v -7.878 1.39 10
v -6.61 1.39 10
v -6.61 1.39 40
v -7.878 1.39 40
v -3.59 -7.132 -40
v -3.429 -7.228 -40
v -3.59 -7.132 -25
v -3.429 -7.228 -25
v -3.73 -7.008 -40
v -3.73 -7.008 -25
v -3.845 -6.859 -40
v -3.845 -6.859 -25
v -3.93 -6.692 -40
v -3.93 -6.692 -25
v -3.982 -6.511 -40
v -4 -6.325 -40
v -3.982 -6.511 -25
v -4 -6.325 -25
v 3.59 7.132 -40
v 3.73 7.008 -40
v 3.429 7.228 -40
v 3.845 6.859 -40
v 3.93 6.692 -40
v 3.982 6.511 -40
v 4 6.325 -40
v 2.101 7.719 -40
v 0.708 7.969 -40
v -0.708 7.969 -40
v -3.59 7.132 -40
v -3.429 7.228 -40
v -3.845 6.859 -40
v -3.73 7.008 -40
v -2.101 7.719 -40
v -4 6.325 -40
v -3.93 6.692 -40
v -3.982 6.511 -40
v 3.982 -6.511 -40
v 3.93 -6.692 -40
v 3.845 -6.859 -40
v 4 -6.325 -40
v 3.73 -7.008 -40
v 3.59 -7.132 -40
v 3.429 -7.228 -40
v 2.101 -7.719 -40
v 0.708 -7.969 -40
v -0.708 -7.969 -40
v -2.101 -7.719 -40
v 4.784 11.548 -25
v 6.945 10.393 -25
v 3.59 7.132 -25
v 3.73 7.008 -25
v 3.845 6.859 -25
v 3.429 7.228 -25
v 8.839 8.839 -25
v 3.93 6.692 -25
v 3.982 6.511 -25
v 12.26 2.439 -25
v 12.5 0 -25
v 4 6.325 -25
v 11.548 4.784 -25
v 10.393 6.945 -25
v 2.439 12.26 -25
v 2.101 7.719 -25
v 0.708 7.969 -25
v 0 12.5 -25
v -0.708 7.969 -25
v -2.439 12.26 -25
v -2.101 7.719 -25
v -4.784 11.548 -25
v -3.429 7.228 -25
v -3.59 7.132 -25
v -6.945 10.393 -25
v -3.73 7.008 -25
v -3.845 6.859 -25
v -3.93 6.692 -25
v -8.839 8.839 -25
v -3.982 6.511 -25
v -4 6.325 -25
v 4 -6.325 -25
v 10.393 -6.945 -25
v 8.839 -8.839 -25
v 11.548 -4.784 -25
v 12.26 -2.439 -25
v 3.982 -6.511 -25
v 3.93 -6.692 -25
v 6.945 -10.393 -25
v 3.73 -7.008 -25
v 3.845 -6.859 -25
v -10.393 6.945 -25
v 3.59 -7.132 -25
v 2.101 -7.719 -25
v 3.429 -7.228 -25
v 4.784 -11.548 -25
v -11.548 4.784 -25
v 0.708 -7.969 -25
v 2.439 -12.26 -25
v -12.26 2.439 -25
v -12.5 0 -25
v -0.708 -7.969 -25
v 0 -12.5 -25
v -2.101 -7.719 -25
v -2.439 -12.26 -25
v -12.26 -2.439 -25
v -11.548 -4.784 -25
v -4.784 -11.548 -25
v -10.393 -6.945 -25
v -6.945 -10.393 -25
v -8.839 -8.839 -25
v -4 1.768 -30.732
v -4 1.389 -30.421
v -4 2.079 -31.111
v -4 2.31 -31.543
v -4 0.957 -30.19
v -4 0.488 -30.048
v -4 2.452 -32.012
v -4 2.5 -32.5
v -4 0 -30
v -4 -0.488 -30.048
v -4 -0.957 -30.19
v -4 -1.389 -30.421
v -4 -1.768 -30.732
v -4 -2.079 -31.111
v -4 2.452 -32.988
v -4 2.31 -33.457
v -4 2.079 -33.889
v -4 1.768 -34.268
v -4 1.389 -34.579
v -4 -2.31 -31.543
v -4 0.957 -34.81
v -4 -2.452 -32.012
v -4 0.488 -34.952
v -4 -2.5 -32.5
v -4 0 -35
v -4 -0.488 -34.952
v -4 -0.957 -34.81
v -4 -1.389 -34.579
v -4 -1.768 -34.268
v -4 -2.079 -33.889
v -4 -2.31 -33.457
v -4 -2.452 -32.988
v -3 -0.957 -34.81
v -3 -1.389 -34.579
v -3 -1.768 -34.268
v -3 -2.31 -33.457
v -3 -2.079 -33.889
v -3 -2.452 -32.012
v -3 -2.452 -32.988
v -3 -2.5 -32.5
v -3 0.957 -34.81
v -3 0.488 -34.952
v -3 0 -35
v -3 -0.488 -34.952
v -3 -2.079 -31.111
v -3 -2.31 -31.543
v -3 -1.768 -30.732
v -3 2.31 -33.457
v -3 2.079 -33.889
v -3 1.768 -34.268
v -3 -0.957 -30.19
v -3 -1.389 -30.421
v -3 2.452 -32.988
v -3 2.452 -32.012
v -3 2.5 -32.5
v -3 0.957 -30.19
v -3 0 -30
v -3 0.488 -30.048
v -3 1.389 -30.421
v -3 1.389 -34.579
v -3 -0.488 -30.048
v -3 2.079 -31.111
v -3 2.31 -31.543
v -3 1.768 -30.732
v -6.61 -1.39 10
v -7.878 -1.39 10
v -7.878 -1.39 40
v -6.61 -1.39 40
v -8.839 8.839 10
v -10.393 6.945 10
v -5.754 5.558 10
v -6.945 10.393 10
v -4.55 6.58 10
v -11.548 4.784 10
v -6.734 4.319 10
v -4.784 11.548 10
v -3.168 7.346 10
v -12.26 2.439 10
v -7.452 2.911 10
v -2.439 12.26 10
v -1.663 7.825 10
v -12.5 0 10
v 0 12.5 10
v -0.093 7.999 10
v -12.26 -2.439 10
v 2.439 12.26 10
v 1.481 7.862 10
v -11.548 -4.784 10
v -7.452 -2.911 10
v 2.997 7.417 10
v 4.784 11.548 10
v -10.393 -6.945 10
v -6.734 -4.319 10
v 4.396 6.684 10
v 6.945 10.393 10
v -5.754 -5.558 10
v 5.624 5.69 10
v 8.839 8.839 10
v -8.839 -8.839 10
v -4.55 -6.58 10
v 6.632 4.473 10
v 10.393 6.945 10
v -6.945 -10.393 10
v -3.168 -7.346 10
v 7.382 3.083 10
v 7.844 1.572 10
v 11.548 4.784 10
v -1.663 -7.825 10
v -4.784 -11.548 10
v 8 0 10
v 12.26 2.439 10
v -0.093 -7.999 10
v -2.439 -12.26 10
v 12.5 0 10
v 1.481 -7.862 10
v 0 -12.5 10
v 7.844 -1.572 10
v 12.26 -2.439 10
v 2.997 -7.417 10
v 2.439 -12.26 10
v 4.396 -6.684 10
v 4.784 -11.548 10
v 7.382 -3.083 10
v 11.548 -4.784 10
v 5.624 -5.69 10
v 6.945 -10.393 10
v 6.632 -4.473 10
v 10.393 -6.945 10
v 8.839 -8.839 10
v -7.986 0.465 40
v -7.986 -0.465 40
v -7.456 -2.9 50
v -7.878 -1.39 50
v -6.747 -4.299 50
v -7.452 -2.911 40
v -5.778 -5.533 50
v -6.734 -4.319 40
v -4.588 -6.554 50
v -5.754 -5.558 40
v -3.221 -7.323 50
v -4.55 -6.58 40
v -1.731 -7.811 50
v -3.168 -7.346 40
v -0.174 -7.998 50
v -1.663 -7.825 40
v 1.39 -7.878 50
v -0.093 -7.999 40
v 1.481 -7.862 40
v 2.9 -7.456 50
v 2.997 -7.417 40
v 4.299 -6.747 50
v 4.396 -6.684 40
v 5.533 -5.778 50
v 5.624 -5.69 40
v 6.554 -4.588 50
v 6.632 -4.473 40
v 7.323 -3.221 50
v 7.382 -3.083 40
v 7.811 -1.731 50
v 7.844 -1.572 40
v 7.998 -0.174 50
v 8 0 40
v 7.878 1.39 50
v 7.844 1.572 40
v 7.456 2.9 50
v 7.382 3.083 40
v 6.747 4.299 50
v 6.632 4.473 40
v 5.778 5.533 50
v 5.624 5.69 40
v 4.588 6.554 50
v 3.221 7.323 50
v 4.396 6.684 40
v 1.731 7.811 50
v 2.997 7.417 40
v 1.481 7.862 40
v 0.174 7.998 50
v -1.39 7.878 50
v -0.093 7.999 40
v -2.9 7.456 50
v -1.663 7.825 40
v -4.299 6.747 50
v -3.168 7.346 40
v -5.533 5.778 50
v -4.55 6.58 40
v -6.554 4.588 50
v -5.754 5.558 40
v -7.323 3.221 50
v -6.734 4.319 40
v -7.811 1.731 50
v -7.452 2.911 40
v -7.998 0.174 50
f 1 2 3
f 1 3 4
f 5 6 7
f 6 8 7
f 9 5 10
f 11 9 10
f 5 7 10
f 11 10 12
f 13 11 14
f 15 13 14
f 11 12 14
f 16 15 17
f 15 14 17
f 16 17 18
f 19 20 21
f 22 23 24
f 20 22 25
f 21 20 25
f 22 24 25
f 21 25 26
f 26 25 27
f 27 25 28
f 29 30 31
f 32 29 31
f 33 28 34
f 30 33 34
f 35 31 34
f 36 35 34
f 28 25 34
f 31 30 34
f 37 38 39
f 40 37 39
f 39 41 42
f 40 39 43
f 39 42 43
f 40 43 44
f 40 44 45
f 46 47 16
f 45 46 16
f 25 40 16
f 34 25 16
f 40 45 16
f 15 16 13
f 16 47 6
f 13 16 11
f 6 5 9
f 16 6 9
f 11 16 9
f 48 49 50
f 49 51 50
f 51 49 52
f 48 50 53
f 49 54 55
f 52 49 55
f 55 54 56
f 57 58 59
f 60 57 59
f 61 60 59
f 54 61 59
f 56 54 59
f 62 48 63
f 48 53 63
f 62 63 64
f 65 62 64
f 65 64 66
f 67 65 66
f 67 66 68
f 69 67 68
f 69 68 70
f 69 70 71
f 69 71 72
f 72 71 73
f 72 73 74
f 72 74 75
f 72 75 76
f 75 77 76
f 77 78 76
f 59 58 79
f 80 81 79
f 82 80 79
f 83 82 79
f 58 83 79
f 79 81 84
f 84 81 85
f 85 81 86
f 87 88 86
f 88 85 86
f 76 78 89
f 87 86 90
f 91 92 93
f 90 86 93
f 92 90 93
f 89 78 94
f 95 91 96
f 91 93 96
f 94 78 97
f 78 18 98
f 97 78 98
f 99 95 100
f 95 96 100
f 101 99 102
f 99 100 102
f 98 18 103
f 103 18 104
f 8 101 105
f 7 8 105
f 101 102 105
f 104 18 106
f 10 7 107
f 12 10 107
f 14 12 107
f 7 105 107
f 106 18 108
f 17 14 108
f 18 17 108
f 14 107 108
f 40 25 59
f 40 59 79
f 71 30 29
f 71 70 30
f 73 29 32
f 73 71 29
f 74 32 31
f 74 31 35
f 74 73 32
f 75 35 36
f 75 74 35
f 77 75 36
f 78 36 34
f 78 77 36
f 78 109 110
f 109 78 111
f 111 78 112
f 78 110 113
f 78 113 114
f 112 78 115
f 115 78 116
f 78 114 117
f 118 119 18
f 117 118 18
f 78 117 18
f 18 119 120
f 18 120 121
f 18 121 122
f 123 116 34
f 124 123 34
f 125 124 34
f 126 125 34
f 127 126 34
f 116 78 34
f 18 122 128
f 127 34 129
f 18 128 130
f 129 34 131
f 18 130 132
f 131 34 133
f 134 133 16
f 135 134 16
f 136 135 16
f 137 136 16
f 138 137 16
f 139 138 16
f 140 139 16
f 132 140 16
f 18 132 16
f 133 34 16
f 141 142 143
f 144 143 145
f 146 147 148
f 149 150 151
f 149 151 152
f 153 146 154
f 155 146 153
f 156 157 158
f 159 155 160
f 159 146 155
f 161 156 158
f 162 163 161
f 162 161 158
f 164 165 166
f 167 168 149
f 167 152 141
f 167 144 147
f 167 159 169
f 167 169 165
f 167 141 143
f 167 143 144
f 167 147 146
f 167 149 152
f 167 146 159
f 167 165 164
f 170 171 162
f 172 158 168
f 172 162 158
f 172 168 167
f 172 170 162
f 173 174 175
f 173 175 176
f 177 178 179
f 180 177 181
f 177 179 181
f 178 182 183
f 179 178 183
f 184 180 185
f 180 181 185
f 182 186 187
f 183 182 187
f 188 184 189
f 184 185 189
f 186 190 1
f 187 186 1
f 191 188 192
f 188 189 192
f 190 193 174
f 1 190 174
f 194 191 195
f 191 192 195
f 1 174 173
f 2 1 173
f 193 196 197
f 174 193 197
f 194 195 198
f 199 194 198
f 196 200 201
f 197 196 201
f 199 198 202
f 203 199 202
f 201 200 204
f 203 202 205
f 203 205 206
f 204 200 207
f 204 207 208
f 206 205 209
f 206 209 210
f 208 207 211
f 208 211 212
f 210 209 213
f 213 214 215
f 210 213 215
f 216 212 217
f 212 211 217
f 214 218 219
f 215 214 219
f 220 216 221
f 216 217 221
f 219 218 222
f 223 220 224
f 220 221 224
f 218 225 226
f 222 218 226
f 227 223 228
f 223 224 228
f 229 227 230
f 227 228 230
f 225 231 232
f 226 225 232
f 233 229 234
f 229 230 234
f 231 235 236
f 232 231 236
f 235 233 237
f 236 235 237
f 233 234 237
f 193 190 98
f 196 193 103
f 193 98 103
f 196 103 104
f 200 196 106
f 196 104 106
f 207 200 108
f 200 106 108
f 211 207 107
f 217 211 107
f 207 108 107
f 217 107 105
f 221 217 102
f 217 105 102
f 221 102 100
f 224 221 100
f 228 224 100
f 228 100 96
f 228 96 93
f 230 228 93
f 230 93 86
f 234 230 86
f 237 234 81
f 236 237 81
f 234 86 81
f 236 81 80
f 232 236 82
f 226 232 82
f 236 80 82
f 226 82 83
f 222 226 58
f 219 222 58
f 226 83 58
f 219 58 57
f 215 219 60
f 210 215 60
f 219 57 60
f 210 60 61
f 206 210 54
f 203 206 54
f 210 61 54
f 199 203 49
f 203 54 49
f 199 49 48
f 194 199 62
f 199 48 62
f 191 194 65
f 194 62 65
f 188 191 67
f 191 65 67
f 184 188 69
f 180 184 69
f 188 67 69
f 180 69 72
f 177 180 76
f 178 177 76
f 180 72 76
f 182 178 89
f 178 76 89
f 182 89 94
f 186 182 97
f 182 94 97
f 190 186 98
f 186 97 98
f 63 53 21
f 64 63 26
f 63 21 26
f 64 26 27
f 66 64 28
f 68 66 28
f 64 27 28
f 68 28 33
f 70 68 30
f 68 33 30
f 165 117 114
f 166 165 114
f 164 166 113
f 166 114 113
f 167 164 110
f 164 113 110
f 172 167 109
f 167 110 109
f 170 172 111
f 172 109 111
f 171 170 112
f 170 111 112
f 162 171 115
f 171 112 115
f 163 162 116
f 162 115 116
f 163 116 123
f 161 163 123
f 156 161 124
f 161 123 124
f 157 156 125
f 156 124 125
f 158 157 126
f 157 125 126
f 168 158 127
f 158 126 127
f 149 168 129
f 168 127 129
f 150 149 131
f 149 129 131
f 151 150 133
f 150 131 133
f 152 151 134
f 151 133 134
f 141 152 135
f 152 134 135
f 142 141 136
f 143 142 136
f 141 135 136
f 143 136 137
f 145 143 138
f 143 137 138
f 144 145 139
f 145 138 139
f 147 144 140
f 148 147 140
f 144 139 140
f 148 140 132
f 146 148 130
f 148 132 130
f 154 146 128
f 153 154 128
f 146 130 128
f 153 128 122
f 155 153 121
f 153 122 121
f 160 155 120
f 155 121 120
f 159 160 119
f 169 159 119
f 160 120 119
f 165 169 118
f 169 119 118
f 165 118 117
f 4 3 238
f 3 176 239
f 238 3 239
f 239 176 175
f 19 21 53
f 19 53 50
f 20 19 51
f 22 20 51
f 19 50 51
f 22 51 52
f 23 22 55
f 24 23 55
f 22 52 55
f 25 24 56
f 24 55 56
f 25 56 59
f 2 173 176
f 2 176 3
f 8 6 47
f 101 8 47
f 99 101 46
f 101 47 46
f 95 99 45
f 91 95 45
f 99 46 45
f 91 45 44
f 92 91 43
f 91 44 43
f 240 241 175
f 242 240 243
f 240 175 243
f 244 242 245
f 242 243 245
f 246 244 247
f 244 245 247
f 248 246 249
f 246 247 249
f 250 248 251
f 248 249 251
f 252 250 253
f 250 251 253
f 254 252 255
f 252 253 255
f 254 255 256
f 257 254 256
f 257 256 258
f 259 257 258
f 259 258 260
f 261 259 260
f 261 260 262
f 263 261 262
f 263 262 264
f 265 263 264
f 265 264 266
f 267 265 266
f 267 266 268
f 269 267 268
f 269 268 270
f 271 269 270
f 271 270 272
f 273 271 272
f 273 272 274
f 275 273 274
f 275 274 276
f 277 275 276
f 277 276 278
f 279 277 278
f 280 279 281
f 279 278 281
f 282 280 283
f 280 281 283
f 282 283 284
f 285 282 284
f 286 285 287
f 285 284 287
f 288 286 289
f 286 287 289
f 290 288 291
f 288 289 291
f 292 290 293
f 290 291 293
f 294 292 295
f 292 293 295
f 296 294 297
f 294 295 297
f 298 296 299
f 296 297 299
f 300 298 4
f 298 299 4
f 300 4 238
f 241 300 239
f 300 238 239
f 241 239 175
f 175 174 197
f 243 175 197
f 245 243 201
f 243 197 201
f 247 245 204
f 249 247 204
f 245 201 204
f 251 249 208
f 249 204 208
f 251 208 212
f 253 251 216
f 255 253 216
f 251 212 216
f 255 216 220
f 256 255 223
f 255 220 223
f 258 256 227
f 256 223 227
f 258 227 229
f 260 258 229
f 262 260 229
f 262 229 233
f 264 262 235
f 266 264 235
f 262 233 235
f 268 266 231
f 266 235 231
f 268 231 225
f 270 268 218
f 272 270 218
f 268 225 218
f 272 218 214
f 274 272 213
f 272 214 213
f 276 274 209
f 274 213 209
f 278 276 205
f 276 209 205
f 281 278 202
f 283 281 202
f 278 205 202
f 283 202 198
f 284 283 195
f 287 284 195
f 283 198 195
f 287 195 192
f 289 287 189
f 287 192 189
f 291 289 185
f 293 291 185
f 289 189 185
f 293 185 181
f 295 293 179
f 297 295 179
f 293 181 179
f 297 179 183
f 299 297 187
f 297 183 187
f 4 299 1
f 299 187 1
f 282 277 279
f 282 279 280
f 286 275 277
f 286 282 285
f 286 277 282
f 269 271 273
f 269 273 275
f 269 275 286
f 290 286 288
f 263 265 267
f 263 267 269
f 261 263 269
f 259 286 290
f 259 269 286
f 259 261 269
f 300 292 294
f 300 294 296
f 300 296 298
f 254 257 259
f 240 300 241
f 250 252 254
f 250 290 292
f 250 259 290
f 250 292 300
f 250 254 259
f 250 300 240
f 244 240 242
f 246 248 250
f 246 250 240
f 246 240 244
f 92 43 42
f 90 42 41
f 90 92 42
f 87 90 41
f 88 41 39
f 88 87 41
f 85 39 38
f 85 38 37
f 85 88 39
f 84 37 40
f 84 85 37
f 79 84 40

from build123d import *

# Parameters (mm, degrees)
CUT_EXTRUDE2_START  = -30
CUT_EXTRUDE2_DEPTH  = 30
SKETCH6_R           = 8
BOSS_EXTRUDE1_DEPTH = 10
CUT_EXTRUDE3_DEPTH  = 15
FILLET1_R           = 1
SKETCH8_R           = 2.5
CUT_EXTRUDE4_DEPTH  = 1


with BuildPart() as part:
    # Sketch2 → Revolve2 (revolve)
    with BuildSketch(Plane(origin=(0, 0, 0), x_dir=(1, 0, 0), z_dir=(0, 1, 0)), mode=Mode.PRIVATE) as revolve2_sk:
        Polygon((0, -40), (8, -40), (8, -10), (12.5, -10), (12.5, 25), (8, 25), (8, 40), (0, 40), align=None)
    revolve(revolve2_sk.sketch.rotate(Axis((0, 0, -364.100348117), (0, 0, 1)), 180), axis=Axis((0, 0, -364.100348117), (0, 0, 1)))

    # Sketch4 → Cut-Extrude2 (cut)
    with BuildSketch(Plane.XY.offset(40).offset(CUT_EXTRUDE2_START)):
        with BuildLine():
            Line((-6.61, 1.39), (-7.878318348, 1.39))
            ThreePointArc((-7.878318348, 1.39), (-8, 0), (-7.878318348, -1.39))
            Line((-7.878318348, -1.39), (-6.61, -1.39))
            Line((-6.61, -1.39), (-6.61, 1.39))
        make_face()
    extrude(amount=CUT_EXTRUDE2_DEPTH, mode=Mode.SUBTRACT)

    # Sketch6 → Boss-Extrude1 (add)
    with BuildSketch(Plane.XY.offset(40)):
        with Locations(Location((0, 0, 0), (0, 0, 190.005924043))):
            Circle(SKETCH6_R)
    extrude(amount=BOSS_EXTRUDE1_DEPTH)

    # Sketch7 → Cut-Extrude3 (cut)
    with BuildSketch(Plane(origin=(0, 0, -40), x_dir=(-1, 0, 0), z_dir=(0, 0, -1))):
        with BuildLine():
            Line((-4, 6.92820323), (-4, -6.92820323))
            ThreePointArc((-4, -6.92820323), (-8, 0), (-4, 6.92820323))
        make_face()
        with BuildLine():
            Line((4, 6.92820323), (4, -6.92820323))
            ThreePointArc((4, -6.92820323), (8, 0), (4, 6.92820323))
        make_face()
    extrude(amount=-CUT_EXTRUDE3_DEPTH, mode=Mode.SUBTRACT)

    # Fillet1
    fillet1_edges = [part.edges().sort_by_distance(p)[0] for p in [
        (4, 6.92820323, -32.5),
        (4, -6.92820323, -32.5),
        (-4, -6.92820323, -32.5),
        (-4, 6.92820323, -32.5),
    ]]
    fillet(fillet1_edges, radius=FILLET1_R)

    # Sketch8 → Cut-Extrude4 (cut)
    with BuildSketch(Plane.ZY.offset(4)):
        with Locations((-32.5, 0)):
            Circle(SKETCH8_R)
    extrude(amount=-CUT_EXTRUDE4_DEPTH, mode=Mode.SUBTRACT)


solid = part.part
